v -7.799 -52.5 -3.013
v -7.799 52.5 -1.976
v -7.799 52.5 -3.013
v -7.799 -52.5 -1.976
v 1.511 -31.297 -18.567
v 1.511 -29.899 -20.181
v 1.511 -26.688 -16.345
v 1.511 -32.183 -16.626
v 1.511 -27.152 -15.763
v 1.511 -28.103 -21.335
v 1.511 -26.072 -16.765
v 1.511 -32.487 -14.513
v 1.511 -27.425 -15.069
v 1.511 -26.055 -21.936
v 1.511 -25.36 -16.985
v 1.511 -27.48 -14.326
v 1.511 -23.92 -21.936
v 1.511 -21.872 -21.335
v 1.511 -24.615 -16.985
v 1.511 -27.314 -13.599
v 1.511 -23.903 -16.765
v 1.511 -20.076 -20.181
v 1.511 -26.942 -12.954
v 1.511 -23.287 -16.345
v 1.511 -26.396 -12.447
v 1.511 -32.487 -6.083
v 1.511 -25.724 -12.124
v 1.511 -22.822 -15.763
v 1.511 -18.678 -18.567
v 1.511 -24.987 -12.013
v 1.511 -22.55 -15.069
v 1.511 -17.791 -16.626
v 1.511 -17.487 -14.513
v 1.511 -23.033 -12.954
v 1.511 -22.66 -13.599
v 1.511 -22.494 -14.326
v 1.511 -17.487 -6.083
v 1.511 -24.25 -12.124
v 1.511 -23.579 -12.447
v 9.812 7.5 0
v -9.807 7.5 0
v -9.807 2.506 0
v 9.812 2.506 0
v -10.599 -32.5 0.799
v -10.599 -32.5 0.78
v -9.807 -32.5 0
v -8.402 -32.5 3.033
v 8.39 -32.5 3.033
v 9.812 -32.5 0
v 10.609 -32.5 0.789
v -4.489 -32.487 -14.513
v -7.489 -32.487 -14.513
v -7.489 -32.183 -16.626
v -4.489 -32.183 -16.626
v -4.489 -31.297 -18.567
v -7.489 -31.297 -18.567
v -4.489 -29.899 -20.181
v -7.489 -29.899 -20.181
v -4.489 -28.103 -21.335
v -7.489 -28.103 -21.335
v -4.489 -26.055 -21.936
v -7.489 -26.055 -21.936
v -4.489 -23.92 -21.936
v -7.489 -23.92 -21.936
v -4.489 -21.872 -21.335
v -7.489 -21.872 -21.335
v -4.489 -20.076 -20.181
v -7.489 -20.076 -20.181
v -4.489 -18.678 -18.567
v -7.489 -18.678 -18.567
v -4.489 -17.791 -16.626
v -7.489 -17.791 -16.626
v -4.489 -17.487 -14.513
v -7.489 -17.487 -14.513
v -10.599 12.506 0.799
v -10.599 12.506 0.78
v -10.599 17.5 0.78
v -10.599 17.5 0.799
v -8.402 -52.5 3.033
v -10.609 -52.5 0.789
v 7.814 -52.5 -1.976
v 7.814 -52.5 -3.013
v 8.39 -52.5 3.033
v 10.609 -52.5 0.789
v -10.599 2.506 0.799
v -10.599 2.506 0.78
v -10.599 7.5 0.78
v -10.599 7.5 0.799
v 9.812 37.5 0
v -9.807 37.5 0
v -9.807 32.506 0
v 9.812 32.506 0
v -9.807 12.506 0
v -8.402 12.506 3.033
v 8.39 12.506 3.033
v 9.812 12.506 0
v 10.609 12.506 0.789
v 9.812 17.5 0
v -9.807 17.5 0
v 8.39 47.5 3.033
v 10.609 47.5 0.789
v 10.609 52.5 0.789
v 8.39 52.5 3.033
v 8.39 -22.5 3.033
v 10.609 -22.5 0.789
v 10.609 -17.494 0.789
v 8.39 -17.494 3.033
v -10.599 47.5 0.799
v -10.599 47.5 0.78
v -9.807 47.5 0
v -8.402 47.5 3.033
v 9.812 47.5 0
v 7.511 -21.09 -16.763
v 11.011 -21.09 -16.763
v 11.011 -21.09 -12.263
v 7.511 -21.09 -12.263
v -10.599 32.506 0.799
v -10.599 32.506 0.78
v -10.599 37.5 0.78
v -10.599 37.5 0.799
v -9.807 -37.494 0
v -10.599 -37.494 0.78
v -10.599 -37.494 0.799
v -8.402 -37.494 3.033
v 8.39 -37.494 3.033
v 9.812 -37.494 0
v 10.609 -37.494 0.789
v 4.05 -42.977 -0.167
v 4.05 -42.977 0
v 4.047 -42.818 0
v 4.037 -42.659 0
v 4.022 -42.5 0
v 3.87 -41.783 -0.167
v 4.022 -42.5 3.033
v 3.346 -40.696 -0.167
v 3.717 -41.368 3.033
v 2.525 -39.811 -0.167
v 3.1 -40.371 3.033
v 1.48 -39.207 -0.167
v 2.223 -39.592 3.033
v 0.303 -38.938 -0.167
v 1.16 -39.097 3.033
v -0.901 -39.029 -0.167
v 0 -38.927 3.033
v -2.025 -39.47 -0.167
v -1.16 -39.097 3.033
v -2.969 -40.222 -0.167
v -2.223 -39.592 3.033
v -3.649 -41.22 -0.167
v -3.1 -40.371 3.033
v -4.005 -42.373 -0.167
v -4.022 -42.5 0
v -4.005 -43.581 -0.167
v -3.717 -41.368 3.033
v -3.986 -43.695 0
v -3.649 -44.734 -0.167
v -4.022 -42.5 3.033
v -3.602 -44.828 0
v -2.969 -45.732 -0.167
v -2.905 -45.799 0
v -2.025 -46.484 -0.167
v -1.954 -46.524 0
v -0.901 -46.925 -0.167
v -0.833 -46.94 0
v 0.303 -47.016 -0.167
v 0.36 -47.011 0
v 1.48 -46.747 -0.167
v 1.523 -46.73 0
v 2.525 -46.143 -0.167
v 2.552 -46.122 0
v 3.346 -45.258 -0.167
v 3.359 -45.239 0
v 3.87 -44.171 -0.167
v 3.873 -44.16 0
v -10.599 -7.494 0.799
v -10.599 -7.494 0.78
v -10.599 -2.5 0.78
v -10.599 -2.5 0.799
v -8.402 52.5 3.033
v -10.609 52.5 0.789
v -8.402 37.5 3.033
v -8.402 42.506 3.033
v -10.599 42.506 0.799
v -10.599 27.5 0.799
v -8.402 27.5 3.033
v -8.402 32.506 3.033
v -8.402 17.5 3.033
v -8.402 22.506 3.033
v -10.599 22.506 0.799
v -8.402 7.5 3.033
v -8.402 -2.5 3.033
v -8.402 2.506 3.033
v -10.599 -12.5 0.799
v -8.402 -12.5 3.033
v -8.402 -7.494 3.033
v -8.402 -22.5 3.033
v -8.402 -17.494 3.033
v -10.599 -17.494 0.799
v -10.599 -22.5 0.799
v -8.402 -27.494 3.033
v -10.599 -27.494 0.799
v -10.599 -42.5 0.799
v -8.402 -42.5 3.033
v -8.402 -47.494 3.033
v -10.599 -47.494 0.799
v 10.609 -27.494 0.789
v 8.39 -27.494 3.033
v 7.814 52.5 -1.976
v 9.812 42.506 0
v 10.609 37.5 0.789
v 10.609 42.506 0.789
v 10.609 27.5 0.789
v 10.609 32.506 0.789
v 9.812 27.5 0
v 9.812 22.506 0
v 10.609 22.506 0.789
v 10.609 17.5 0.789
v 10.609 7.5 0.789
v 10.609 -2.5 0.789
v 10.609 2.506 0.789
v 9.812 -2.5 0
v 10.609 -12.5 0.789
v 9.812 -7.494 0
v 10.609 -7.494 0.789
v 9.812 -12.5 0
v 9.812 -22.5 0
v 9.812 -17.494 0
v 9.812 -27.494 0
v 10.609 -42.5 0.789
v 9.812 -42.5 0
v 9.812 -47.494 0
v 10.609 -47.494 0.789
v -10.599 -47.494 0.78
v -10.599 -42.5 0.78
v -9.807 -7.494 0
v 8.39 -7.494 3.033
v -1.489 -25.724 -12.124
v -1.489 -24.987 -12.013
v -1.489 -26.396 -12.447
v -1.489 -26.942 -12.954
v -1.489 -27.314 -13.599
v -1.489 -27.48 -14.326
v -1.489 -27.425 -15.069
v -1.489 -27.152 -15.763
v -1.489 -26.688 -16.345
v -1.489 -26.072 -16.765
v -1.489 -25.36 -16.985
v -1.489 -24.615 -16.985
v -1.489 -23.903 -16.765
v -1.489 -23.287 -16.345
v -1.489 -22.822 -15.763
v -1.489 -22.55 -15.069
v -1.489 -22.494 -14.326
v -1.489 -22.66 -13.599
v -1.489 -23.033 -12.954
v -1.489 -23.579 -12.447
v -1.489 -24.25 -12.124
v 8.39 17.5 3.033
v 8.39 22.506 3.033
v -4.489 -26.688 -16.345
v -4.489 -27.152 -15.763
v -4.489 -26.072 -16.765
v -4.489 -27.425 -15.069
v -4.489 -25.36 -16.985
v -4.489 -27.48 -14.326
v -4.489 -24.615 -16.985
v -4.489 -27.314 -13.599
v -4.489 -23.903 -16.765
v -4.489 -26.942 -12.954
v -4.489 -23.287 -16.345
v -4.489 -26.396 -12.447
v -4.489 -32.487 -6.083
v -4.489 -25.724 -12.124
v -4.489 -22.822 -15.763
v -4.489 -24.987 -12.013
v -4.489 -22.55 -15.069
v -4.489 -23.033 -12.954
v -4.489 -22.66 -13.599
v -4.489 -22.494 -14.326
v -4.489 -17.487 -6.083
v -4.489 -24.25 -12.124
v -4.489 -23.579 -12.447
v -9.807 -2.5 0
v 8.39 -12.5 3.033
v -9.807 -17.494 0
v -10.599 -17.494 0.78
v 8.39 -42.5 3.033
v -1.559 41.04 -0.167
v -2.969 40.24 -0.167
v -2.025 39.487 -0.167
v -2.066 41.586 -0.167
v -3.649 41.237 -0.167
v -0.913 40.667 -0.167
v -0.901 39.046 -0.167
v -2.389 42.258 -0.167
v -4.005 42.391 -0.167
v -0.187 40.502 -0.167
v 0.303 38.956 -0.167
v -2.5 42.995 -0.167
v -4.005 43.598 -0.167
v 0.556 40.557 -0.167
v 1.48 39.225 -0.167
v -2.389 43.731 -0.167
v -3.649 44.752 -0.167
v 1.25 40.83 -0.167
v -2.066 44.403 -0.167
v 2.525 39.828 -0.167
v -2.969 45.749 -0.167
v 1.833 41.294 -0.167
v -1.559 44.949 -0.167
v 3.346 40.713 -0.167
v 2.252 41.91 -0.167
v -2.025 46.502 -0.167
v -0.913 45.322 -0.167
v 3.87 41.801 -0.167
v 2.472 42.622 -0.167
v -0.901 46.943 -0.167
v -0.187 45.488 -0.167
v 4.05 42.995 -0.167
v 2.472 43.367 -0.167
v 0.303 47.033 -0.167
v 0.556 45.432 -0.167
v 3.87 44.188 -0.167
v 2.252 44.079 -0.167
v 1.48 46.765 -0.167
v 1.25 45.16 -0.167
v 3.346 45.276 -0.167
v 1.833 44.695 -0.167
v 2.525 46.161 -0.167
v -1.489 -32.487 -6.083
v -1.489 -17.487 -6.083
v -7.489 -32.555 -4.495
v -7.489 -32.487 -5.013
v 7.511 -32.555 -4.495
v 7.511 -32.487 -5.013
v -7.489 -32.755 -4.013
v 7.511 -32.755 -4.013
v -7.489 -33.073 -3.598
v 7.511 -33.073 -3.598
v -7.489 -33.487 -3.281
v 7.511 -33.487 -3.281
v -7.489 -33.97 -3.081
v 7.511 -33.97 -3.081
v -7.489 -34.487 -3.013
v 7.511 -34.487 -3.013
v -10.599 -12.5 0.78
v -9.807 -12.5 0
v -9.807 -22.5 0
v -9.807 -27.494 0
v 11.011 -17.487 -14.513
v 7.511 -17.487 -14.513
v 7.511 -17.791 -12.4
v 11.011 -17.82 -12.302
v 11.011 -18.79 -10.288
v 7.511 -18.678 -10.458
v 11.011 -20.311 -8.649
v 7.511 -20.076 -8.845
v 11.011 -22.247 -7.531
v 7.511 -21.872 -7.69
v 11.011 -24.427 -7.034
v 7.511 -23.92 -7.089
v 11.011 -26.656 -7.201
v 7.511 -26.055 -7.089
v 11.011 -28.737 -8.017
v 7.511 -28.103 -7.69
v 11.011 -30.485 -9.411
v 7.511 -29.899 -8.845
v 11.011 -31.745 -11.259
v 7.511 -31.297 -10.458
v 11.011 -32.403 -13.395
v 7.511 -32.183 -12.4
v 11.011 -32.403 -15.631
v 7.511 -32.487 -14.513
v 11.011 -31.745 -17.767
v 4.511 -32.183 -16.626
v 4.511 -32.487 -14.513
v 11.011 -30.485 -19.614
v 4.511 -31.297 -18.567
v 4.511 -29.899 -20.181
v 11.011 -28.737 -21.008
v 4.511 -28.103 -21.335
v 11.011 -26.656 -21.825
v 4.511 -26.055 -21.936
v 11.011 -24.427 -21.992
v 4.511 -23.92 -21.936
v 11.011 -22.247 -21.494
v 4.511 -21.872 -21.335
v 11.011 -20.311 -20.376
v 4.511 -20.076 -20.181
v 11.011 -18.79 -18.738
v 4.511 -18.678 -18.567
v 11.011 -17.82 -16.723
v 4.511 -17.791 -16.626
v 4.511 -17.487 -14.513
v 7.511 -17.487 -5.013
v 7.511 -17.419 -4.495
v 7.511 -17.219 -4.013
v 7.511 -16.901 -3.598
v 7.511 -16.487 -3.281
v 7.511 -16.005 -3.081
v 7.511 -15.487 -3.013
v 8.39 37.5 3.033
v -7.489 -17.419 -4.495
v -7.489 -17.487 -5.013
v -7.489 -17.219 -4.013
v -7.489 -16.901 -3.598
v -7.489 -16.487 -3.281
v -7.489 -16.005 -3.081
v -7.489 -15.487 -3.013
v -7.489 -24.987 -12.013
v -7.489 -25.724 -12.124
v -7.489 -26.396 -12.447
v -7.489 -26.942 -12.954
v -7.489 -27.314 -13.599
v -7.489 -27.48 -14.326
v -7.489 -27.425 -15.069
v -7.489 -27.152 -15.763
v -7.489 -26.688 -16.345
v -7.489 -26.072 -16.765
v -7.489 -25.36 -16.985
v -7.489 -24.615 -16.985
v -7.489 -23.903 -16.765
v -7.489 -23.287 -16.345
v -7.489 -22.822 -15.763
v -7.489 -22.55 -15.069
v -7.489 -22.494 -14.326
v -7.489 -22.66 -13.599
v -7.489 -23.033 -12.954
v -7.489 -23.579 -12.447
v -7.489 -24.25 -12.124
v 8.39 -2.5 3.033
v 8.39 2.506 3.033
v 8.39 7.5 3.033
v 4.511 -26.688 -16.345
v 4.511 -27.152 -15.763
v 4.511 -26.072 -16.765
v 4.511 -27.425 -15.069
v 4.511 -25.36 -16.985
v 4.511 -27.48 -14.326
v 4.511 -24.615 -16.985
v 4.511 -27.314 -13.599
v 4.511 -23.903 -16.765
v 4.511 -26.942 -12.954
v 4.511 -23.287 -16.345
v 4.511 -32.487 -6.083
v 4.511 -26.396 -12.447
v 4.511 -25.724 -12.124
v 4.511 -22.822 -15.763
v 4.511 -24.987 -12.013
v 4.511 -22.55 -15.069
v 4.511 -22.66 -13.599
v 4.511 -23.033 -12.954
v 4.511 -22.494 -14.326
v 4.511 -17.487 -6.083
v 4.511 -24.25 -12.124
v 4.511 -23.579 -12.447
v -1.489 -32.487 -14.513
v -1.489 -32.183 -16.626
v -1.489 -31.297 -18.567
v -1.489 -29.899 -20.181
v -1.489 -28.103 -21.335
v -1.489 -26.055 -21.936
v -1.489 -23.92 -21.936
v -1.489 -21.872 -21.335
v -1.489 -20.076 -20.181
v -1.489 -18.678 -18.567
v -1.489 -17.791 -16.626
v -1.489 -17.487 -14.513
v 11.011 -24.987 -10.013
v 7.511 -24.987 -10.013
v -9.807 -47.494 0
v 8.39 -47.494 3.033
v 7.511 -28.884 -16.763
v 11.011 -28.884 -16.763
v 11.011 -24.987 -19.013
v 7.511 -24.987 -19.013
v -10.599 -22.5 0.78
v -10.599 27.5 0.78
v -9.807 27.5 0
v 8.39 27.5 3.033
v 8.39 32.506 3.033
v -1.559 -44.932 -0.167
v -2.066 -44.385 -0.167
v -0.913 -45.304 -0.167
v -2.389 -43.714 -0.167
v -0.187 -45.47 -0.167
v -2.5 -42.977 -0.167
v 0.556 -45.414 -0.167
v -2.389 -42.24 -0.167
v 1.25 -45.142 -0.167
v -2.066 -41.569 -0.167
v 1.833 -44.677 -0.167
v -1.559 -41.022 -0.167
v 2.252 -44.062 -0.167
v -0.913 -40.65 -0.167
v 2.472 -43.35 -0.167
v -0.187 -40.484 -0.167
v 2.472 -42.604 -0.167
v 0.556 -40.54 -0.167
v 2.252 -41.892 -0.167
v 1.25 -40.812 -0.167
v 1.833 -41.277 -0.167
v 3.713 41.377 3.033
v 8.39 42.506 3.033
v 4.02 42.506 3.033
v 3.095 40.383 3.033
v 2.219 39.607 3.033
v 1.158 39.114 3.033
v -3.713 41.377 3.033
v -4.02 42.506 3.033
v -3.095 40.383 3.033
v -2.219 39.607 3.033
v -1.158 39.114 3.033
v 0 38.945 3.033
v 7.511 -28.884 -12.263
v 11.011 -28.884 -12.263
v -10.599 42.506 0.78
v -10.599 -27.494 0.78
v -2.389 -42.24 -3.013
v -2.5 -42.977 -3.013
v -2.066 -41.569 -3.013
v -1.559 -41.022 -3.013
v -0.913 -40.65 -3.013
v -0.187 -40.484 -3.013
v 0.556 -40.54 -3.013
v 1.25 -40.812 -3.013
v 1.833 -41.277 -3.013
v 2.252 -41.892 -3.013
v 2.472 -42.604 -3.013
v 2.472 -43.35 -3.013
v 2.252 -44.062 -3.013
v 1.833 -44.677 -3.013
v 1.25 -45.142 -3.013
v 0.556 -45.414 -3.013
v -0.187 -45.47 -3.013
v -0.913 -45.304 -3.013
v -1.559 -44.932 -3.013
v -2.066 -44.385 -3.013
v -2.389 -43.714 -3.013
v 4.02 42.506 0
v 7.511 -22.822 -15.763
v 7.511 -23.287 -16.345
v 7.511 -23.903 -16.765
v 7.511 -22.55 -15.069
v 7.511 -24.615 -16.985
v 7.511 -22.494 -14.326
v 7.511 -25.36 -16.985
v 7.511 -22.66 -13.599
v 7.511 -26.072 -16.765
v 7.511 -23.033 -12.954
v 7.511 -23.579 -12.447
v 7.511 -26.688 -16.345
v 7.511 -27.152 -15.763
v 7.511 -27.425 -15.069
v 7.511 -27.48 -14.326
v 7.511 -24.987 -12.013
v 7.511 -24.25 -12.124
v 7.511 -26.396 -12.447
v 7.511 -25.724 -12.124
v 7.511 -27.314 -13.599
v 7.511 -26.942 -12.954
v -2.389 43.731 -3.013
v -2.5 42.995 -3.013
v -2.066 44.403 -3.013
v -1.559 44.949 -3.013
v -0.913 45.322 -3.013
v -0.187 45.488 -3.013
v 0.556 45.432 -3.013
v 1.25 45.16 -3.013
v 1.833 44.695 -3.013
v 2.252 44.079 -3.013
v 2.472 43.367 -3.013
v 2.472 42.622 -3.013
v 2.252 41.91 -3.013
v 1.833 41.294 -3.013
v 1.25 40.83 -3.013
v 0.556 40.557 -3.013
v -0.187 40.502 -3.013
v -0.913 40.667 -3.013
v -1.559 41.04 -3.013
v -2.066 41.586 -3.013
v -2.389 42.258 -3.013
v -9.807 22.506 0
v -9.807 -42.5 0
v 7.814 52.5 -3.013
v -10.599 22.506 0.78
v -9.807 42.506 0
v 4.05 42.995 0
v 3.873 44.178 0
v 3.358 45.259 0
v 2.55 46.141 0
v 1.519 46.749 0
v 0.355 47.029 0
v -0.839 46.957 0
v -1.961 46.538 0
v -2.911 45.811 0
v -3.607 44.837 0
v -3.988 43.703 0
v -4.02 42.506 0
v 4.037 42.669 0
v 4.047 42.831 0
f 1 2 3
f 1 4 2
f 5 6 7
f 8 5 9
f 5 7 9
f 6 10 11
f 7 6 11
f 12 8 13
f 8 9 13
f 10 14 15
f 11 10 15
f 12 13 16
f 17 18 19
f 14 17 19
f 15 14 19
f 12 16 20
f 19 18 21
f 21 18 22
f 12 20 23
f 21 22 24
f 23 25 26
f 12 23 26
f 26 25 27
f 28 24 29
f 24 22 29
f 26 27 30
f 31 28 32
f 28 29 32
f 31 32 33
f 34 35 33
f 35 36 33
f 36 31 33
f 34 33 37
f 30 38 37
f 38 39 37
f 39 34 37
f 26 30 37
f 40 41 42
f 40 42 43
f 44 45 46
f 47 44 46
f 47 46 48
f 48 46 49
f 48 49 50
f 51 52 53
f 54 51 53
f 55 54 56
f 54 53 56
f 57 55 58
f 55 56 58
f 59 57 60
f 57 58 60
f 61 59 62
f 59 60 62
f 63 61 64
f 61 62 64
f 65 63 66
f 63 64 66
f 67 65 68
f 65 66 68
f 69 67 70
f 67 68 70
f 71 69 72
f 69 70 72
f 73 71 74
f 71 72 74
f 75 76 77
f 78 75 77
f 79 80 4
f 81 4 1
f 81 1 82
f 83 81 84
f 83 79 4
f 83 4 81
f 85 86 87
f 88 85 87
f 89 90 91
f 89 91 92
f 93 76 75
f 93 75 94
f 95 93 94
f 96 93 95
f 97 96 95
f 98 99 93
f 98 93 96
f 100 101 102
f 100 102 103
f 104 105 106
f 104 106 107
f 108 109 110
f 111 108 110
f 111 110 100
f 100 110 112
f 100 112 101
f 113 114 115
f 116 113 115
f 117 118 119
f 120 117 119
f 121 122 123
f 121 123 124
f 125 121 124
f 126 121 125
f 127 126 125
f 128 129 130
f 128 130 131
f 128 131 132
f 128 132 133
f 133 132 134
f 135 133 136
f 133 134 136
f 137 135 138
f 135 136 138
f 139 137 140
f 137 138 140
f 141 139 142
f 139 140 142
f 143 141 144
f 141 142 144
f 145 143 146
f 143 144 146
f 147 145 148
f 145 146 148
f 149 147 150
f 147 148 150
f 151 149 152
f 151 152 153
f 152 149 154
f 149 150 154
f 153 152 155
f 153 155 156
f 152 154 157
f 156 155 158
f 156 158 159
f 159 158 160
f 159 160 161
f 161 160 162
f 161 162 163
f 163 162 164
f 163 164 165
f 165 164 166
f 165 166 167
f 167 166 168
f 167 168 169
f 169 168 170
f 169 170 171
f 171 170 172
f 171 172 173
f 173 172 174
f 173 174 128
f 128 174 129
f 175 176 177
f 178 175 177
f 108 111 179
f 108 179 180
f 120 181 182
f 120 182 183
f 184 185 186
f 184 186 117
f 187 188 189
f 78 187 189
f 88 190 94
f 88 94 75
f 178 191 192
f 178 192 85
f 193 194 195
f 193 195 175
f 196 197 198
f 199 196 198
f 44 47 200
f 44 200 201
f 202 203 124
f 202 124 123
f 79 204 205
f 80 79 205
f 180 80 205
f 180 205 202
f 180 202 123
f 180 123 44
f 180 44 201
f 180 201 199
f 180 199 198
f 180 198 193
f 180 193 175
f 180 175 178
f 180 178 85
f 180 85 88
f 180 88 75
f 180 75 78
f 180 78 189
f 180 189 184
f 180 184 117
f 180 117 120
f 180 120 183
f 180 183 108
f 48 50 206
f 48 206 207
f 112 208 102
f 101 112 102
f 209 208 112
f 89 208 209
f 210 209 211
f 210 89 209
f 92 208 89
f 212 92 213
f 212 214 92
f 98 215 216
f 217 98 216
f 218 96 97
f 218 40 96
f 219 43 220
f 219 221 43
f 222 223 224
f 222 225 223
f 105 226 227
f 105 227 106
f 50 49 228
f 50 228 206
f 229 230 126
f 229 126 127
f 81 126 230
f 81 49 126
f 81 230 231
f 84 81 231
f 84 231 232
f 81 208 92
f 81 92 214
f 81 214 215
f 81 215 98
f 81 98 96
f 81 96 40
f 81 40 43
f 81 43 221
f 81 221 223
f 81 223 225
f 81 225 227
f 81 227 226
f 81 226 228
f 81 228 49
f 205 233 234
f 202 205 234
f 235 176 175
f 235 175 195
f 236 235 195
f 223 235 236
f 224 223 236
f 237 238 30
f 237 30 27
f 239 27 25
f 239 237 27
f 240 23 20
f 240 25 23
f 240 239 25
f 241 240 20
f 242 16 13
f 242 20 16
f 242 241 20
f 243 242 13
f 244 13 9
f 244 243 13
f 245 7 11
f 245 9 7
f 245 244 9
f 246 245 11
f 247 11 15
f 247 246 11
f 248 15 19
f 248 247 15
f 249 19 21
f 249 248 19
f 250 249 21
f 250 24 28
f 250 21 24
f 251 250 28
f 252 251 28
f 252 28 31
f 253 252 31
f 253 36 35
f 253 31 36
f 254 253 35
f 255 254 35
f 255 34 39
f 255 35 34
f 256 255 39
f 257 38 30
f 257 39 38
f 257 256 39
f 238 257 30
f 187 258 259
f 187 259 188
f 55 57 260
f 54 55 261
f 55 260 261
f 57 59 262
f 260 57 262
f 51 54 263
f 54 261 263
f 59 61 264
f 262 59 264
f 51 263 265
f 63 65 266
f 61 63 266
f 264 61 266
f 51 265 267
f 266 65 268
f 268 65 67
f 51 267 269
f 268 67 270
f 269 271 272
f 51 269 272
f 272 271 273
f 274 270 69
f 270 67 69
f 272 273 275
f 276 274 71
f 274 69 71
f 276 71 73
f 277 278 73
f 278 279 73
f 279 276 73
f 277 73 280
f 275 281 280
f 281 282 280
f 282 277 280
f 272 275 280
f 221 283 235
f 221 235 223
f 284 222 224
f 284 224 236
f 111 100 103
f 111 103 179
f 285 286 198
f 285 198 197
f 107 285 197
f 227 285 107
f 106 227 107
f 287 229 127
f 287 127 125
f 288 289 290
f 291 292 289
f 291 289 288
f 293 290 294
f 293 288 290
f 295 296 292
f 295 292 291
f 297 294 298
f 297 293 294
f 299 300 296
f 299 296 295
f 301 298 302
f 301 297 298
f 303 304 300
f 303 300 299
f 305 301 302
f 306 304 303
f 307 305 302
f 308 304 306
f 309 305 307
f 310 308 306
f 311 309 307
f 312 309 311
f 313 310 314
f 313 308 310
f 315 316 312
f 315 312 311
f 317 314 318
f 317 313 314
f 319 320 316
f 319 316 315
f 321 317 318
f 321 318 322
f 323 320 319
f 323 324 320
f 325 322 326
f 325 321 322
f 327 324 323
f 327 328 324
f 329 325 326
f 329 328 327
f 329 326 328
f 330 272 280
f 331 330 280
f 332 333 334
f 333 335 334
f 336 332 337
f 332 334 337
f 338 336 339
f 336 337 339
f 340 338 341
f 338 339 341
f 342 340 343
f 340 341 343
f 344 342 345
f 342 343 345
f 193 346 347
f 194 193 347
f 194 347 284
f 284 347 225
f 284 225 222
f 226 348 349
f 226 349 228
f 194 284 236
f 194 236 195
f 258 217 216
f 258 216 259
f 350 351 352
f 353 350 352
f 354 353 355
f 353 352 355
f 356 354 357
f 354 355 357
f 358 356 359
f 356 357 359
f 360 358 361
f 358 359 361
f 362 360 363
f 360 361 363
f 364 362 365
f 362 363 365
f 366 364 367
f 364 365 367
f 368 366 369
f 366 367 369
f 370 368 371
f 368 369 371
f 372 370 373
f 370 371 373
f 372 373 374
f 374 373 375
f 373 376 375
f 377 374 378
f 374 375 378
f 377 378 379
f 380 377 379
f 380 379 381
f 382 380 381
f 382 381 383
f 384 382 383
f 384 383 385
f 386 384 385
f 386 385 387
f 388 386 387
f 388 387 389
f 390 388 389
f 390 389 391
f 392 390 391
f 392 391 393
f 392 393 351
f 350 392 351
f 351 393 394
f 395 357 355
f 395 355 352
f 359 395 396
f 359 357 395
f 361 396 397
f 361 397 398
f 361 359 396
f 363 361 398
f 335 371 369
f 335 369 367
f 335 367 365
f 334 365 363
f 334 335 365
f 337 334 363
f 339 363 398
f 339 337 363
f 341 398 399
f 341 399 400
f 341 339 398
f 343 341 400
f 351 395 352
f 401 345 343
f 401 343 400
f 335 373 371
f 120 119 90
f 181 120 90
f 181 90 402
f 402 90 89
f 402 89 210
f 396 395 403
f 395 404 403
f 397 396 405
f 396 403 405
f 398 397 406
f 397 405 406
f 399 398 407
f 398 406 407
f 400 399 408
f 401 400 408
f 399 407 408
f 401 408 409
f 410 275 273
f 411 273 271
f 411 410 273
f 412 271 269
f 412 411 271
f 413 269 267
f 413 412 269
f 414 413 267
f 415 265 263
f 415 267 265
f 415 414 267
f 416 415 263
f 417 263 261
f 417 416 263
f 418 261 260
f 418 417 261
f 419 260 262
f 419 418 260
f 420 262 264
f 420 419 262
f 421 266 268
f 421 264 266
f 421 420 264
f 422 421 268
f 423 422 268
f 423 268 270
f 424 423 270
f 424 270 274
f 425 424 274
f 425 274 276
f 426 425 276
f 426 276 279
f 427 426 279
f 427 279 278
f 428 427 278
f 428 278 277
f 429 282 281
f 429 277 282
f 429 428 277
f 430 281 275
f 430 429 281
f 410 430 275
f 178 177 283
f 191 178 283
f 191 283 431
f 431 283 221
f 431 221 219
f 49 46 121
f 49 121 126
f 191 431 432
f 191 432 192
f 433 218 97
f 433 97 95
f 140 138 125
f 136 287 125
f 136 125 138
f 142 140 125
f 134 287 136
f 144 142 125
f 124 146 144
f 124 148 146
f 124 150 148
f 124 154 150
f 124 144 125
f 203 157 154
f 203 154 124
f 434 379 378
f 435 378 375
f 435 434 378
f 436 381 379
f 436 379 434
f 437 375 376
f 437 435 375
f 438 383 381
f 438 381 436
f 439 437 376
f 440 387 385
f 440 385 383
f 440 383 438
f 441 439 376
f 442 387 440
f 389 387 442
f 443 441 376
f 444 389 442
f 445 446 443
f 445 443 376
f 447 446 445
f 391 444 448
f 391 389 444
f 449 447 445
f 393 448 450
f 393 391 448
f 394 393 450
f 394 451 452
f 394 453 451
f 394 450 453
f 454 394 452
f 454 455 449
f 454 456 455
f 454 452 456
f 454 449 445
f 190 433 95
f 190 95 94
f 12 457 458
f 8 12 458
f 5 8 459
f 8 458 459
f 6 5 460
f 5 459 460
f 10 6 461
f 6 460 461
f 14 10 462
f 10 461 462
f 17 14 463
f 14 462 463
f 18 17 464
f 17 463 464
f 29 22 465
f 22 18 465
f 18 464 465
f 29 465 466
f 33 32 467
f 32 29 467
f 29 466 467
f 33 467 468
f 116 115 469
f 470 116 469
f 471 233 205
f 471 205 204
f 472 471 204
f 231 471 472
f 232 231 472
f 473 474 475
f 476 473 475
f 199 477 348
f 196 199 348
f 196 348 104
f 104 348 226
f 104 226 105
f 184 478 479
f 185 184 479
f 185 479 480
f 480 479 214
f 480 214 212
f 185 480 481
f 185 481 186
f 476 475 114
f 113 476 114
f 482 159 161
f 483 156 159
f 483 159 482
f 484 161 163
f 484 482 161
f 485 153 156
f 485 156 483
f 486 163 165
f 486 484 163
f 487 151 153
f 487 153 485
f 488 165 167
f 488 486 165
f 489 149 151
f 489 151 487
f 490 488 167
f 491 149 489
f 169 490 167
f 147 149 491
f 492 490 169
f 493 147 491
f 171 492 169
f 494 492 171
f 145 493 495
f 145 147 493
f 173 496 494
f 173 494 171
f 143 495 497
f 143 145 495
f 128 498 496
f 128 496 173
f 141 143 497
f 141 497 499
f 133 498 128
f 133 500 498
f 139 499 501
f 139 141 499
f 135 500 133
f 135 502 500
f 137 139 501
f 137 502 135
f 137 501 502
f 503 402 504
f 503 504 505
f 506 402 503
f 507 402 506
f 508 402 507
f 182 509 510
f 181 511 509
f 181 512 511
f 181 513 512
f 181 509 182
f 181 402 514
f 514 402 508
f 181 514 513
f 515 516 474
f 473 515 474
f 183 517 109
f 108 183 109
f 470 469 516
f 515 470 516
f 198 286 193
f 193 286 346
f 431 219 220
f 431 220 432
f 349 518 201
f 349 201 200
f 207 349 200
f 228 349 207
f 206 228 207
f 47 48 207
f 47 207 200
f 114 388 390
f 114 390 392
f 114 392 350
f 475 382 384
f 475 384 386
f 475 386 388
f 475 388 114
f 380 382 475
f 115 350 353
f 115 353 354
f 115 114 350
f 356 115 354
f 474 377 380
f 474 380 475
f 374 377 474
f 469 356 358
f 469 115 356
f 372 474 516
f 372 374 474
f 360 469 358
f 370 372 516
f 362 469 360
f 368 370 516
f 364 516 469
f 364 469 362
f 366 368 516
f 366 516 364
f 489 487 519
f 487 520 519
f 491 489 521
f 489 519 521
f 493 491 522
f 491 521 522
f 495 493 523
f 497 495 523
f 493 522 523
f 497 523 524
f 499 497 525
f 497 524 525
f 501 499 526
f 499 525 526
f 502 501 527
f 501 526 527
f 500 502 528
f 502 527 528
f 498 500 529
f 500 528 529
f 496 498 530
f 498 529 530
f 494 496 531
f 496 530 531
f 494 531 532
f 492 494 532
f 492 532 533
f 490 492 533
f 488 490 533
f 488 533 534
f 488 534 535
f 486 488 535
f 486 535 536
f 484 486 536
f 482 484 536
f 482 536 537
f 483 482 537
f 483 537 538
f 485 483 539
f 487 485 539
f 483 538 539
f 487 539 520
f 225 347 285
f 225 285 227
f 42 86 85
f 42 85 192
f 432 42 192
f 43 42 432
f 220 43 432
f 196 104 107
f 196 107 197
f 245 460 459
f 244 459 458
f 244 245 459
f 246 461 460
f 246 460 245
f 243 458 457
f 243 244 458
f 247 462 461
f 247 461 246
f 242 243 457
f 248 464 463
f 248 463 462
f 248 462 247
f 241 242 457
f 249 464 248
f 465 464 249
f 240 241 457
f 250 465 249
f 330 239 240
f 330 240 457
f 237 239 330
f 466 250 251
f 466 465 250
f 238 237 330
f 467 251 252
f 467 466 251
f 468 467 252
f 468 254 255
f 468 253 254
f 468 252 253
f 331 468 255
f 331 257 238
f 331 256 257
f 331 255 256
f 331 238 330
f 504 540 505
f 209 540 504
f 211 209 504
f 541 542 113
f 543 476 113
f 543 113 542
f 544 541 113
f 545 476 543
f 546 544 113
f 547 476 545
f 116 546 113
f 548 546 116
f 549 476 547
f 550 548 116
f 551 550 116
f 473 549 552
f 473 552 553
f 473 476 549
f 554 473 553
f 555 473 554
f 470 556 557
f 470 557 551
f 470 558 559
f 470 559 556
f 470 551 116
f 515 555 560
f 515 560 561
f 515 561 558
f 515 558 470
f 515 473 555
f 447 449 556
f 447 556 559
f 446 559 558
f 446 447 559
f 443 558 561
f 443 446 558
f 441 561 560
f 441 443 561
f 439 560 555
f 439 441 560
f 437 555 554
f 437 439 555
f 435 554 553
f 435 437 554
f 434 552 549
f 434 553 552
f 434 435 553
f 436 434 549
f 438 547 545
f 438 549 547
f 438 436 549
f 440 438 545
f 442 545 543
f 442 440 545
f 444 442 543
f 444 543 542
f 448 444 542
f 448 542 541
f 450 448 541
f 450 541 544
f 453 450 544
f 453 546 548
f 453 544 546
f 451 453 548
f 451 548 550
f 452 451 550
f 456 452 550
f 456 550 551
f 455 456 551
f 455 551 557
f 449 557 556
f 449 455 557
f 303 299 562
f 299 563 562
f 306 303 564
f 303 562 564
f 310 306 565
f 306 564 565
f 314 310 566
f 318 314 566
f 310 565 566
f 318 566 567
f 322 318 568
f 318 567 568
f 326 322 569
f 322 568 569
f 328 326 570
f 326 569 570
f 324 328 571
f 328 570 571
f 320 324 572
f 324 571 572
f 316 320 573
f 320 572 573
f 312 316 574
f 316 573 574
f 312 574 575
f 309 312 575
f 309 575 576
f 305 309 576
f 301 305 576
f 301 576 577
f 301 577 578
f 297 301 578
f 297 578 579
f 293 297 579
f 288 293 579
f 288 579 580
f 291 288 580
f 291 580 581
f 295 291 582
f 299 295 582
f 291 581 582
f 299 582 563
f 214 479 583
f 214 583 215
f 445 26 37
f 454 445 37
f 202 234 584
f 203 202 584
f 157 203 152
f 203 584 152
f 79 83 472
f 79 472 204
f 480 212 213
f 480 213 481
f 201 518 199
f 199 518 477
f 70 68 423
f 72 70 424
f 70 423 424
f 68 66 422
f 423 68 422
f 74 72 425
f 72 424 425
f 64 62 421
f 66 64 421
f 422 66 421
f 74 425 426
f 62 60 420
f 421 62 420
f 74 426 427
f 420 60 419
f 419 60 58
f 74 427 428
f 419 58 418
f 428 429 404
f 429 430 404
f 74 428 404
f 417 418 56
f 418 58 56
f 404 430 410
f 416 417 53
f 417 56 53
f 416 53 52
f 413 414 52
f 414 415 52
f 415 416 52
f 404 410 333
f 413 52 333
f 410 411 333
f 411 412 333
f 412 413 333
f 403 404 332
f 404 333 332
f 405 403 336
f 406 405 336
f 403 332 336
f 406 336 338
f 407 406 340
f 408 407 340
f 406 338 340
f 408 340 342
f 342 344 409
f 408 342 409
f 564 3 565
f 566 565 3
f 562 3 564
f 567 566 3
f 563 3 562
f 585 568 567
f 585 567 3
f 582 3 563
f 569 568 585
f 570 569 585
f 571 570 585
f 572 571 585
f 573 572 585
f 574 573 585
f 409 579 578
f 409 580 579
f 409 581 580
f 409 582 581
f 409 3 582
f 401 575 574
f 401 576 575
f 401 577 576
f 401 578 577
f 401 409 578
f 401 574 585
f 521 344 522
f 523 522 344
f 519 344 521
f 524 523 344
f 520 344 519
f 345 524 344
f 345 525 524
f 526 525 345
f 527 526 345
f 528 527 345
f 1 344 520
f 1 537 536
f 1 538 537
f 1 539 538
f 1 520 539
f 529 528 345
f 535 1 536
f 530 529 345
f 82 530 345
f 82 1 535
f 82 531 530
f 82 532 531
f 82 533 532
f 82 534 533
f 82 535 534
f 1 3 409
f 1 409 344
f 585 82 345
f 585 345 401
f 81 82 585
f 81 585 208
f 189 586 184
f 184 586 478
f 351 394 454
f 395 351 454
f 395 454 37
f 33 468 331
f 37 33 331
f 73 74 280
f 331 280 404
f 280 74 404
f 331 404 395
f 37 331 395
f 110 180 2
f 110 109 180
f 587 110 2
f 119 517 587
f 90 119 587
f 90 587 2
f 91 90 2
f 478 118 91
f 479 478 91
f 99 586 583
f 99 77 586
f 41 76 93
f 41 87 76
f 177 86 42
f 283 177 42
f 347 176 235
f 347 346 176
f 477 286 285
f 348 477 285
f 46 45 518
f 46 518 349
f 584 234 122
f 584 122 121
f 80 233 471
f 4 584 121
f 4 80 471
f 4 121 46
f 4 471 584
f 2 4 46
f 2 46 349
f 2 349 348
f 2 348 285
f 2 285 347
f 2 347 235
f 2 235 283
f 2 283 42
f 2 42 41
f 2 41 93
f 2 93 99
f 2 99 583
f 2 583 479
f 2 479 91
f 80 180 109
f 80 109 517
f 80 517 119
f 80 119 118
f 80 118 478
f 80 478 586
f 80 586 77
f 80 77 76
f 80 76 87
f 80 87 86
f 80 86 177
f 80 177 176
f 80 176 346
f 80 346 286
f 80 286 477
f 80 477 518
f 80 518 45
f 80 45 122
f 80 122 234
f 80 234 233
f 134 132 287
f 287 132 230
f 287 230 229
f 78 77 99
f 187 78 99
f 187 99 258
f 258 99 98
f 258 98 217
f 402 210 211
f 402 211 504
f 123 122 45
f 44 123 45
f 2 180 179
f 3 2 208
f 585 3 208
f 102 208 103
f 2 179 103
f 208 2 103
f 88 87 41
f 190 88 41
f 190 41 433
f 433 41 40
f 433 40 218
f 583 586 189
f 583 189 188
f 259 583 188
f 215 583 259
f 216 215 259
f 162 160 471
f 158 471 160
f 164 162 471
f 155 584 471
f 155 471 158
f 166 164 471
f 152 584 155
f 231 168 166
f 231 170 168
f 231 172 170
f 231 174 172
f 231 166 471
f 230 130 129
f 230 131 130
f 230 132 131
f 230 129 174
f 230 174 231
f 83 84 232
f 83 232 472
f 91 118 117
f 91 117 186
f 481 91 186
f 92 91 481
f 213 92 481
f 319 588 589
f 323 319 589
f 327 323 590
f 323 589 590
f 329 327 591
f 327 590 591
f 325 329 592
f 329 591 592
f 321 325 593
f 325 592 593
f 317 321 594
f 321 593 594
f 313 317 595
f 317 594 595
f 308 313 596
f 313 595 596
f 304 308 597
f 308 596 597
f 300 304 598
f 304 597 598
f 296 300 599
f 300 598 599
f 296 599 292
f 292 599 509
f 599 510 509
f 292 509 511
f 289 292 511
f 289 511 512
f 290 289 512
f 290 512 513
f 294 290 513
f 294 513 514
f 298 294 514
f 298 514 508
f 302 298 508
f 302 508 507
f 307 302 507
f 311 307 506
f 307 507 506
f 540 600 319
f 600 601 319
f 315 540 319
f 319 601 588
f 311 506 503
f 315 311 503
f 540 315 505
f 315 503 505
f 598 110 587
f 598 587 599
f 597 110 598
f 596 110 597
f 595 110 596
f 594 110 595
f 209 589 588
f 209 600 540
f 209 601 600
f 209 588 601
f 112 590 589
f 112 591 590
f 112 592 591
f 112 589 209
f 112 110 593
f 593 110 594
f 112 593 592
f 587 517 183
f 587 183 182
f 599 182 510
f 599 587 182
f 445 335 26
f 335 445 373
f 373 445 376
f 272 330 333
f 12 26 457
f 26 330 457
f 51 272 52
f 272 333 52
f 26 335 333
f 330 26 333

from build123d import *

# Parameters (mm, degrees)
F1_DEPTH       = 52.5
F2_W           = 21.2101023644
F2_H           = 4.993801238
F3_DEPTH       = 5
F5_D           = 5
F5_DEPTH       = 6.1
F5_CBORE_D     = 8.1
F5_CBORE_DEPTH = 3.2
F5_TIP         = 1.5021515476
F6_D           = 5
F6_DEPTH       = 6.1
F6_CBORE_D     = 8.1
F6_CBORE_DEPTH = 3.2
F6_TIP         = 1.5021515476
F7_R           = 2.5
F8_DEPTH       = 15
F9_DEPTH       = 18.5
F11_DEPTH      = 3.5
F13_START      = -3
F12_W          = 16
F12_H          = 15
F13_DEPTH      = 3
F14_START      = -9
F14_DEPTH      = 3
F15_ANGLE      = -90
F18_W          = 25
F18_H          = 18
F19_DEPTH      = 14
F21_R          = 2


with BuildPart() as f1:
    # F0 (on Front) → F1 (new body, symmetric)
    with BuildSketch(Plane.XZ):
        Polygon((-7.7991238795, -1.9758003764), (-7.7991238795, -3.0126834754), (7.814229466, -3.0126834754), (7.814229466, -1.9758003764), (10.6093045324, 0.7892206195), (8.3899200651, 3.0327284253), (-8.4017119181, 3.0327284253), (-10.6092272326, 0.7892206195), align=None)
    extrude(amount=F1_DEPTH, both=True)

    # F2 (on Top) → F3 (cut)
    with BuildSketch(Plane.XY):
        with Locations((0.0056419522, -4.9968052143)):
            Rectangle(F2_W, F2_H)
        with Locations((0.0056419522, -14.9968052143)):
            Rectangle(F2_W, F2_H)
        with Locations((0.0056419522, -24.9968052143)):
            Rectangle(F2_W, F2_H)
        with Locations((0.0056419522, -34.9968052143)):
            Rectangle(F2_W, F2_H)
        with Locations((0.0056419522, -44.9968052143)):
            Rectangle(F2_W, F2_H)
        with Locations((0.0056419522, 5.0031947857)):
            Rectangle(F2_W, F2_H)
        with Locations((0.0056419522, 15.0031947857)):
            Rectangle(F2_W, F2_H)
        with Locations((0.0056419522, 25.0031947857)):
            Rectangle(F2_W, F2_H)
        with Locations((0.0056419522, 35.0031947857)):
            Rectangle(F2_W, F2_H)
        with Locations((0.0056419522, 45.0031947857)):
            Rectangle(F2_W, F2_H)
    extrude(amount=F3_DEPTH, mode=Mode.SUBTRACT)

    # F5
    with Locations(Plane.XY.offset(3.0327284253)):
        with Locations((0, 42.9945960641)):
            CounterBoreHole(F5_D / 2, F5_CBORE_D / 2, F5_CBORE_DEPTH, depth=F5_DEPTH)
            with Locations((0, 0, -(F5_DEPTH + F5_TIP / 2))):  # 118° drill point
                Cone(0, F5_D / 2, F5_TIP, mode=Mode.SUBTRACT)

    # F6
    with Locations(Plane.XY.offset(3.0327284253)):
        with Locations((0, -42.977001518)):
            CounterBoreHole(F6_D / 2, F6_CBORE_D / 2, F6_CBORE_DEPTH, depth=F6_DEPTH)
            with Locations((0, 0, -(F6_DEPTH + F6_TIP / 2))):  # 118° drill point
                Cone(0, F6_D / 2, F6_TIP, mode=Mode.SUBTRACT)


with BuildPart() as f8:
    # F7 (on face) → F8 (new body)
    with BuildSketch(Plane(origin=(0, 0, -3.0126834754), x_dir=(1, 0, 0), z_dir=(0, 0, -1))):
        with BuildLine():
            ThreePointArc((-106.589045567, 38.187250495), (-108.7857447081, 43.4905513539), (-114.089045567, 45.687250495))
            ThreePointArc((-114.089045567, 45.687250495), (-119.3923464259, 43.4905513539), (-121.589045567, 38.187250495))
            ThreePointArc((-121.589045567, 38.187250495), (-119.3923464259, 32.8839496361), (-114.089045567, 30.687250495))
            ThreePointArc((-114.089045567, 30.687250495), (-108.7857447081, 32.8839496361), (-106.589045567, 38.187250495))
        make_face()
        with Locations((-114.089045567, 38.187250495)):
            Circle(F7_R, mode=Mode.SUBTRACT)
        with BuildLine():
            Line((-86.589045567, 45.687250495), (-114.089045567, 45.687250495))
            ThreePointArc((-114.089045567, 45.687250495), (-108.7857447081, 43.4905513539), (-106.589045567, 38.187250495))
            ThreePointArc((-106.589045567, 38.187250495), (-108.7857447081, 32.8839496361), (-114.089045567, 30.687250495))
            Line((-114.089045567, 30.687250495), (-86.589045567, 30.687250495))
            Line((-86.589045567, 30.687250495), (-86.589045567, 45.687250495))
        make_face()
    extrude(amount=F8_DEPTH)

    # F7 (on face) → F9 (join)
    with BuildSketch(Plane(origin=(0, 0, -3.0126834754), x_dir=(1, 0, 0), z_dir=(0, 0, -1))):
        with BuildLine():
            ThreePointArc((-106.589045567, 38.187250495), (-108.7857447081, 43.4905513539), (-114.089045567, 45.687250495))
            ThreePointArc((-114.089045567, 45.687250495), (-119.3923464259, 43.4905513539), (-121.589045567, 38.187250495))
            ThreePointArc((-121.589045567, 38.187250495), (-119.3923464259, 32.8839496361), (-114.089045567, 30.687250495))
            ThreePointArc((-114.089045567, 30.687250495), (-108.7857447081, 32.8839496361), (-106.589045567, 38.187250495))
        make_face()
        with Locations((-114.089045567, 38.187250495)):
            Circle(F7_R, mode=Mode.SUBTRACT)
    extrude(amount=F9_DEPTH)

    # F10 (on face) → F11 (cut)
    with BuildSketch(Plane(origin=(0, 0, -21.5126834754), x_dir=(1, 0, 0), z_dir=(0, 0, -1))):
        Polygon((-111.839045567, 34.2901361779), (-109.589045567, 38.187250495), (-111.839045567, 42.084364812), (-116.339045567, 42.084364812), (-118.589045567, 38.187250495), (-116.339045567, 34.2901361779), align=None)
    extrude(amount=-F11_DEPTH, mode=Mode.SUBTRACT)

    # F12 (on face) → F13 (cut)
    with BuildSketch(Plane.XY.offset(-3.0126834754).offset(F13_START)):
        with Locations((-113.6591356158, -38.187250793)):
            Rectangle(F12_W, F12_H)
    extrude(amount=-F13_DEPTH, mode=Mode.SUBTRACT)

    # F12 (on face) → F14 (cut)
    with BuildSketch(Plane.XY.offset(-3.0126834754).offset(F14_START)):
        with Locations((-113.6591356158, -38.187250793)):
            Rectangle(F12_W, F12_H)
    extrude(amount=-F14_DEPTH, mode=Mode.SUBTRACT)


with BuildPart() as f8_1:
    # F15: moved
    add(f8.part.rotate(Axis((-86.589045567, -38.187250495, -18.0126834754), (0, 1, 0)), F15_ANGLE))


with BuildPart() as f8_2:
    # F16: moved
    add(f8_1.part.moved(Location((94.1, 0, 31))))


with BuildPart() as f8_3:
    # F17: moved
    add(f8_2.part.moved(Location((0, 13.2, 0))))

    # F18 (on face) → F19 (cut)
    with BuildSketch(Plane.XY.offset(12.9873165246)):
        with Locations((0.6974760443, -24.6108990014)):
            Rectangle(F18_W, F18_H)
    extrude(amount=-F19_DEPTH, mode=Mode.SUBTRACT)


with BuildPart() as f1_1:
    add(f1.part)

    # F20: union F8
    add(f8_3.part)

    # F21
    f21_edges = [f1_1.edges().sort_by_distance(p)[0] for p in [
        (0.010954, -32.48725, -3.012683),
        (0.010954, -17.48725, -3.012683),
    ]]
    fillet(f21_edges, radius=F21_R)


solid = f1_1.part
